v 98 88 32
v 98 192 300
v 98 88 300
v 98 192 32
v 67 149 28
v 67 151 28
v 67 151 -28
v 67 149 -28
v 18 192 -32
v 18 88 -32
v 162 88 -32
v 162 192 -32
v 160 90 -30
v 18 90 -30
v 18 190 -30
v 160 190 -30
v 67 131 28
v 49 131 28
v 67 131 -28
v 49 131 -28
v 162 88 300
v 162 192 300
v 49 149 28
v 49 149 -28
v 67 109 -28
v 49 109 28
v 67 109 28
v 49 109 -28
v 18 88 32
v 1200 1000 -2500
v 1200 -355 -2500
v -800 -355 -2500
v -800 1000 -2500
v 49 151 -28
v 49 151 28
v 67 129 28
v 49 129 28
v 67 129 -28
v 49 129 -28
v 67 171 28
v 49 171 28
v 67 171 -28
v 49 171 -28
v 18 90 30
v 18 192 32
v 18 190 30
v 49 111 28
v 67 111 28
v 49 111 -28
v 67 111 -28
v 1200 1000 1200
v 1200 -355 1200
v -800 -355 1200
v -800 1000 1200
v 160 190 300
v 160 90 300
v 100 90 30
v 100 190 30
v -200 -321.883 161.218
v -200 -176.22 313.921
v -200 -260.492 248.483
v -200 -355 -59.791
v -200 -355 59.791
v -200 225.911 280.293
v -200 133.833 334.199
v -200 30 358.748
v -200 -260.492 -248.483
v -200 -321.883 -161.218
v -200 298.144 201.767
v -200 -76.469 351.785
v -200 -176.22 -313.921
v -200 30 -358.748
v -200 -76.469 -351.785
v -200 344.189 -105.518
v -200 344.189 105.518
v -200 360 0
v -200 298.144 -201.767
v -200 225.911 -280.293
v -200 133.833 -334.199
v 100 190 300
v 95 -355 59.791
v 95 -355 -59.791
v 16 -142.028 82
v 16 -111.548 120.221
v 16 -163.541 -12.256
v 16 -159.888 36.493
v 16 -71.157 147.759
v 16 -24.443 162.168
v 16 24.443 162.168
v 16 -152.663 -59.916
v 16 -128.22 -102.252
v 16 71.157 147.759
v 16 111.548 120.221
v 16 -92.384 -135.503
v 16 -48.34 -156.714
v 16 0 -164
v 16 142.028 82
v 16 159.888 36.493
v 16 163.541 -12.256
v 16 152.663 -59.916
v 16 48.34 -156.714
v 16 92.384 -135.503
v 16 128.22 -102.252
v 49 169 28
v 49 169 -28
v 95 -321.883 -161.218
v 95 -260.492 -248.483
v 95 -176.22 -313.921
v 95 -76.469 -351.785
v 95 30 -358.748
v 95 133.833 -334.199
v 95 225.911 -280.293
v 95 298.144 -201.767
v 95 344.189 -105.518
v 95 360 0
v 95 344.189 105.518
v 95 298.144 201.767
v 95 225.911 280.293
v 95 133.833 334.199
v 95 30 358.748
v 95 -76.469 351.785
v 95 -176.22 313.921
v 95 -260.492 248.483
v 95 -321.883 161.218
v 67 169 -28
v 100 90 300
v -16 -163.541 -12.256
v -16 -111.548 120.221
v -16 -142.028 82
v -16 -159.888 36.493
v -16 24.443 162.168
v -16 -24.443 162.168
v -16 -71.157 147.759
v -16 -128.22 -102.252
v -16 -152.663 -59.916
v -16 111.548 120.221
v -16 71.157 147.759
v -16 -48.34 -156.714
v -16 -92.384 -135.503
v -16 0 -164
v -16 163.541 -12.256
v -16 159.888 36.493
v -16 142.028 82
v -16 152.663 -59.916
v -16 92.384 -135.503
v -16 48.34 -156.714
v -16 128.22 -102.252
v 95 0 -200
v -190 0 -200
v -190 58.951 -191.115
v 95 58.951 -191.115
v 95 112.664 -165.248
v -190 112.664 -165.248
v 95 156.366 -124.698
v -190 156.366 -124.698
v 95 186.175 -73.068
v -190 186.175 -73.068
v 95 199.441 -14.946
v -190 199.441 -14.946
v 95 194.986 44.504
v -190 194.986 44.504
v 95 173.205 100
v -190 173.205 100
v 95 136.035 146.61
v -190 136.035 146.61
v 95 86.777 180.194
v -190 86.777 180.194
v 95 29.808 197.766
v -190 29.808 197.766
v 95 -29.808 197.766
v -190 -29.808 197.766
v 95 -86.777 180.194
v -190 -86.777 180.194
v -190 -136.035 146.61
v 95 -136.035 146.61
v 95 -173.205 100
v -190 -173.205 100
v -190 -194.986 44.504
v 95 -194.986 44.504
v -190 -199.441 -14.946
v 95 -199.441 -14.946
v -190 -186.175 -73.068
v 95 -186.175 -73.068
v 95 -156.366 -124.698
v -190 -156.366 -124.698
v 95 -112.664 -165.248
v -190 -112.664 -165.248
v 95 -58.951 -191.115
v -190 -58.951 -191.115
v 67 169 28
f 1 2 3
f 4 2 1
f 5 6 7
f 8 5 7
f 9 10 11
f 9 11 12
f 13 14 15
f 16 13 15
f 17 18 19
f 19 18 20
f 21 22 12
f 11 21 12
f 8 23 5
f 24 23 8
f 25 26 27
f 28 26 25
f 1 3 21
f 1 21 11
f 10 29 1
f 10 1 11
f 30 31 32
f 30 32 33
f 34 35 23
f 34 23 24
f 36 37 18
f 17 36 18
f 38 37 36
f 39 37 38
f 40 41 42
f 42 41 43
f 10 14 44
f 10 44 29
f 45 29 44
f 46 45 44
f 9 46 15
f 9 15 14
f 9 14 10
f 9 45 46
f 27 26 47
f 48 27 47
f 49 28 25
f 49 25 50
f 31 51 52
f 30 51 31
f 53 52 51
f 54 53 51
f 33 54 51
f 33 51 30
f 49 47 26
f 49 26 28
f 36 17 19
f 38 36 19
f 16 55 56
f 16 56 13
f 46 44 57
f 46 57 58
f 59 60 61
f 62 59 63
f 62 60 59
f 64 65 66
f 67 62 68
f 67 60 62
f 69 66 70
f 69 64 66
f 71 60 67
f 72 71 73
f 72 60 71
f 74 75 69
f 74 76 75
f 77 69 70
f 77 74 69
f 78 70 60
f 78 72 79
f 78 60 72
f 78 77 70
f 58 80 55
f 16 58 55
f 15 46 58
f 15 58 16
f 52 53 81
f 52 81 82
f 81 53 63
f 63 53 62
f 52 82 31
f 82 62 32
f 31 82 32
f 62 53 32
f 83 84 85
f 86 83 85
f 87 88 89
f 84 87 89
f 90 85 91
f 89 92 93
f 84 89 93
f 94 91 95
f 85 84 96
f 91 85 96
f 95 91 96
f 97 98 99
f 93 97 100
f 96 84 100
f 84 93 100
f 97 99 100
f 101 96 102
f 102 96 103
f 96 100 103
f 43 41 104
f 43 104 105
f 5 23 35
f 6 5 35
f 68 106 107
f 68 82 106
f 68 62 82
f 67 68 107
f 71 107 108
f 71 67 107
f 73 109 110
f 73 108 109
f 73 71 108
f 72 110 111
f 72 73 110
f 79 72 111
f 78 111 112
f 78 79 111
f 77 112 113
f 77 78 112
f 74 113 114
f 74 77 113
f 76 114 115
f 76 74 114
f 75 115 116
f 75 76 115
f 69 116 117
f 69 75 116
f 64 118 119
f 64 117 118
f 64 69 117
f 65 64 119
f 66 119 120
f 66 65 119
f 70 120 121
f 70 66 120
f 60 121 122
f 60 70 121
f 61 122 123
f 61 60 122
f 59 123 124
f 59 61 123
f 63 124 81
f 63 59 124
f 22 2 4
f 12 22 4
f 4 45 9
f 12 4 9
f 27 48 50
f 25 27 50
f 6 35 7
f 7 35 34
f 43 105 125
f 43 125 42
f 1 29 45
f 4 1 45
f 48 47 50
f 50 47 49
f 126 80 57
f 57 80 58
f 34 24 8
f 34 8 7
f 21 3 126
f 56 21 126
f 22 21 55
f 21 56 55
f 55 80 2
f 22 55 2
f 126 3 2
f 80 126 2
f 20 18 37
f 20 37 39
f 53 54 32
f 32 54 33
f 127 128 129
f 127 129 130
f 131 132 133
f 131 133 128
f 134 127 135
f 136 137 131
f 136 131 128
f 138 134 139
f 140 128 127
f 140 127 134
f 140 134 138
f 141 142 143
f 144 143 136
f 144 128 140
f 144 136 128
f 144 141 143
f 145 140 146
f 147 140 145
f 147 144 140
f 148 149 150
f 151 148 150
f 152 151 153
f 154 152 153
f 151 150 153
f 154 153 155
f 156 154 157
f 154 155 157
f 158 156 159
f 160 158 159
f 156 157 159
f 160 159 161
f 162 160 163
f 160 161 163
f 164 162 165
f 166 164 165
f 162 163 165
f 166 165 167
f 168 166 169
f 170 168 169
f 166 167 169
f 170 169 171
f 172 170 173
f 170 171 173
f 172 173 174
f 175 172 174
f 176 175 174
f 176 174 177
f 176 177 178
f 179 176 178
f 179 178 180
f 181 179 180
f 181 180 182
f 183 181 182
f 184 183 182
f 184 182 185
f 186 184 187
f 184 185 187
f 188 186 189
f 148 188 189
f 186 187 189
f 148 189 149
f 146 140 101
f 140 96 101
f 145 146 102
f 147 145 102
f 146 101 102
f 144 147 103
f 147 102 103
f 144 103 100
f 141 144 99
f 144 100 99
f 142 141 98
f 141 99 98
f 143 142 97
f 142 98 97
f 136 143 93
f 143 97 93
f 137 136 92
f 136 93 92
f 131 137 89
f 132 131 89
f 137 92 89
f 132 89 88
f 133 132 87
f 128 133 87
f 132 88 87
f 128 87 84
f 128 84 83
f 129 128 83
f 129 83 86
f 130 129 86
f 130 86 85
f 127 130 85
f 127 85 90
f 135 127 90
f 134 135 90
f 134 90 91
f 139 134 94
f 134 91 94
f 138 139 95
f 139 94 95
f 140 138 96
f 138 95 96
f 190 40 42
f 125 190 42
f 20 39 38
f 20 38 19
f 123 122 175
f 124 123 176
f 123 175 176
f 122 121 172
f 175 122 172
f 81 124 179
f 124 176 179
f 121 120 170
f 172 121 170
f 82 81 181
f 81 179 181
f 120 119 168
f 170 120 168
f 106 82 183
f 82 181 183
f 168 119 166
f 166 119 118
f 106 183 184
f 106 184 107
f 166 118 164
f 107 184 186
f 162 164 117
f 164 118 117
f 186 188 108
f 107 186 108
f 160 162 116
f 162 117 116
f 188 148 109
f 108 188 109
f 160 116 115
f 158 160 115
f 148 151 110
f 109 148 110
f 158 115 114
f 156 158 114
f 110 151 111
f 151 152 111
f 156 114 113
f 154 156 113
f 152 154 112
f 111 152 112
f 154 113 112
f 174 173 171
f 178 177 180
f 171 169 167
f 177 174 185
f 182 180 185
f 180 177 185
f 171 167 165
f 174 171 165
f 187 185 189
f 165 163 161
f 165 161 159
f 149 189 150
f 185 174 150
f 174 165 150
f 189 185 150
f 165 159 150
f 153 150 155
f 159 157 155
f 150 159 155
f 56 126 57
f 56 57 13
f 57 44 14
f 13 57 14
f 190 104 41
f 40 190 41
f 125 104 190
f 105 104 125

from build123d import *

# Parameters (mm, degrees)
AIR_BOX_START      = -800
SKETCH1_W          = 3700
SKETCH1_H          = 1355
AIR_BOX_DEPTH      = 2000
WHEEL_START        = -190
SKETCH2_R          = 360
SKETCH2_R_2        = 200
WHEEL_DEPTH        = 285
COVER_START        = -200
SKETCH3_R          = 360
COVER_DEPTH        = 10
SKETCH4_R          = 164
ROTOR_DEPTH        = 16
THROAT_OUTER_START = 18
SKETCH5_W          = 64
SKETCH5_H          = 104
THROAT_OUTER_DEPTH = 82
SCOOP_OUTER_START  = 98
SKETCH6_W          = 332
SKETCH6_H          = 104
SCOOP_OUTER_DEPTH  = 64
THROAT_INNER_START = 10
SKETCH7_W          = 60
SKETCH7_H          = 100
THROAT_INNER_DEPTH = 91
SCOOP_INNER_START  = 100
SKETCH8_W          = 340
SKETCH8_H          = 100
SCOOP_INNER_DEPTH  = 60
LOUVER1_START      = 49
SKETCH9_W          = 56
SKETCH9_H          = 2
LOUVER1_DEPTH      = 18
LOUVER2_START      = 49
SKETCH10_W         = 56
SKETCH10_H         = 2
LOUVER2_DEPTH      = 18
LOUVER3_START      = 49
SKETCH11_W         = 56
SKETCH11_H         = 2
LOUVER3_DEPTH      = 18
LOUVER4_START      = 49
SKETCH12_W         = 56
SKETCH12_H         = 2
LOUVER4_DEPTH      = 18


with BuildPart() as part:
    # Sketch1 → air_box (new body)
    with BuildSketch(Plane(origin=(0, 0, 0), x_dir=(0, 0, -1), z_dir=(1, 0, 0)).offset(AIR_BOX_START)):
        with Locations((650, 322.5)):
            Rectangle(SKETCH1_W, SKETCH1_H)
    extrude(amount=AIR_BOX_DEPTH)


with BuildPart() as body_2:
    # Sketch2 → wheel (new body)
    with BuildSketch(Plane(origin=(0, 0, 0), x_dir=(0, 0, -1), z_dir=(1, 0, 0)).offset(WHEEL_START)):
        Circle(SKETCH2_R)
        Circle(SKETCH2_R_2, mode=Mode.SUBTRACT)
    extrude(amount=WHEEL_DEPTH)


with BuildPart() as body_3:
    # Sketch3 → cover (new body)
    with BuildSketch(Plane(origin=(0, 0, 0), x_dir=(0, 0, -1), z_dir=(1, 0, 0)).offset(COVER_START)):
        Circle(SKETCH3_R)
    extrude(amount=COVER_DEPTH)


with BuildPart() as body_4:
    # Sketch4 → rotor (new, symmetric)
    with BuildSketch(Plane(origin=(0, 0, 0), x_dir=(0, 0, -1), z_dir=(1, 0, 0))):
        Circle(SKETCH4_R)
    extrude(amount=ROTOR_DEPTH, both=True)


with BuildPart() as body_5:
    # Sketch5 → throat_outer (new body)
    with BuildSketch(Plane(origin=(0, 0, 0), x_dir=(0, 0, -1), z_dir=(1, 0, 0)).offset(THROAT_OUTER_START)):
        with Locations((0, 140)):
            Rectangle(SKETCH5_W, SKETCH5_H)
    extrude(amount=THROAT_OUTER_DEPTH)


with BuildPart() as body_6:
    # Sketch6 → scoop_outer (new body)
    with BuildSketch(Plane(origin=(0, 0, 0), x_dir=(0, 0, -1), z_dir=(1, 0, 0)).offset(SCOOP_OUTER_START)):
        with Locations((-134, 140)):
            Rectangle(SKETCH6_W, SKETCH6_H)
    extrude(amount=SCOOP_OUTER_DEPTH)

    # Combine1: union body 5
    add(body_5.part)


with BuildPart() as body_6_2:
    # Sketch7 → throat_inner (new body)
    with BuildSketch(Plane(origin=(0, 0, 0), x_dir=(0, 0, -1), z_dir=(1, 0, 0)).offset(THROAT_INNER_START)):
        with Locations((0, 140)):
            Rectangle(SKETCH7_W, SKETCH7_H)
    extrude(amount=THROAT_INNER_DEPTH)


with BuildPart() as body_7:
    # Sketch8 → scoop_inner (new body)
    with BuildSketch(Plane(origin=(0, 0, 0), x_dir=(0, 0, -1), z_dir=(1, 0, 0)).offset(SCOOP_INNER_START)):
        with Locations((-140, 140)):
            Rectangle(SKETCH8_W, SKETCH8_H)
    extrude(amount=SCOOP_INNER_DEPTH)


with BuildPart() as body_6_1:
    add(body_6.part)

    # Combine2: cut body 6 2, body 7
    add(body_6_2.part, mode=Mode.SUBTRACT)
    add(body_7.part, mode=Mode.SUBTRACT)


with BuildPart() as body_6_3:
    # Sketch9 → louver1 (new body)
    with BuildSketch(Plane(origin=(0, 0, 0), x_dir=(0, 0, -1), z_dir=(1, 0, 0)).offset(LOUVER1_START)):
        with Locations((0, 110)):
            Rectangle(SKETCH9_W, SKETCH9_H)
    extrude(amount=LOUVER1_DEPTH)


with BuildPart() as body_7_2:
    # Sketch10 → louver2 (new body)
    with BuildSketch(Plane(origin=(0, 0, 0), x_dir=(0, 0, -1), z_dir=(1, 0, 0)).offset(LOUVER2_START)):
        with Locations((0, 130)):
            Rectangle(SKETCH10_W, SKETCH10_H)
    extrude(amount=LOUVER2_DEPTH)


with BuildPart() as body_8:
    # Sketch11 → louver3 (new body)
    with BuildSketch(Plane(origin=(0, 0, 0), x_dir=(0, 0, -1), z_dir=(1, 0, 0)).offset(LOUVER3_START)):
        with Locations((0, 150)):
            Rectangle(SKETCH11_W, SKETCH11_H)
    extrude(amount=LOUVER3_DEPTH)


with BuildPart() as body_9:
    # Sketch12 → louver4 (new body)
    with BuildSketch(Plane(origin=(0, 0, 0), x_dir=(0, 0, -1), z_dir=(1, 0, 0)).offset(LOUVER4_START)):
        with Locations((0, 170)):
            Rectangle(SKETCH12_W, SKETCH12_H)
    extrude(amount=LOUVER4_DEPTH)


with BuildPart() as part_1:
    add(part.part)

    # Combine3: cut body 2
    add(body_2.part, mode=Mode.SUBTRACT)

    # Combine4: cut body 3
    add(body_3.part, mode=Mode.SUBTRACT)

    # Combine5: cut body 4
    add(body_4.part, mode=Mode.SUBTRACT)

    # Combine6: cut body 6
    add(body_6_1.part, mode=Mode.SUBTRACT)

    # Combine7: cut body 6 3
    add(body_6_3.part, mode=Mode.SUBTRACT)

    # Combine8: cut body 7 2
    add(body_7_2.part, mode=Mode.SUBTRACT)

    # Combine9: cut body 8
    add(body_8.part, mode=Mode.SUBTRACT)

    # Combine10: cut body 9
    add(body_9.part, mode=Mode.SUBTRACT)


solid = part_1.part
